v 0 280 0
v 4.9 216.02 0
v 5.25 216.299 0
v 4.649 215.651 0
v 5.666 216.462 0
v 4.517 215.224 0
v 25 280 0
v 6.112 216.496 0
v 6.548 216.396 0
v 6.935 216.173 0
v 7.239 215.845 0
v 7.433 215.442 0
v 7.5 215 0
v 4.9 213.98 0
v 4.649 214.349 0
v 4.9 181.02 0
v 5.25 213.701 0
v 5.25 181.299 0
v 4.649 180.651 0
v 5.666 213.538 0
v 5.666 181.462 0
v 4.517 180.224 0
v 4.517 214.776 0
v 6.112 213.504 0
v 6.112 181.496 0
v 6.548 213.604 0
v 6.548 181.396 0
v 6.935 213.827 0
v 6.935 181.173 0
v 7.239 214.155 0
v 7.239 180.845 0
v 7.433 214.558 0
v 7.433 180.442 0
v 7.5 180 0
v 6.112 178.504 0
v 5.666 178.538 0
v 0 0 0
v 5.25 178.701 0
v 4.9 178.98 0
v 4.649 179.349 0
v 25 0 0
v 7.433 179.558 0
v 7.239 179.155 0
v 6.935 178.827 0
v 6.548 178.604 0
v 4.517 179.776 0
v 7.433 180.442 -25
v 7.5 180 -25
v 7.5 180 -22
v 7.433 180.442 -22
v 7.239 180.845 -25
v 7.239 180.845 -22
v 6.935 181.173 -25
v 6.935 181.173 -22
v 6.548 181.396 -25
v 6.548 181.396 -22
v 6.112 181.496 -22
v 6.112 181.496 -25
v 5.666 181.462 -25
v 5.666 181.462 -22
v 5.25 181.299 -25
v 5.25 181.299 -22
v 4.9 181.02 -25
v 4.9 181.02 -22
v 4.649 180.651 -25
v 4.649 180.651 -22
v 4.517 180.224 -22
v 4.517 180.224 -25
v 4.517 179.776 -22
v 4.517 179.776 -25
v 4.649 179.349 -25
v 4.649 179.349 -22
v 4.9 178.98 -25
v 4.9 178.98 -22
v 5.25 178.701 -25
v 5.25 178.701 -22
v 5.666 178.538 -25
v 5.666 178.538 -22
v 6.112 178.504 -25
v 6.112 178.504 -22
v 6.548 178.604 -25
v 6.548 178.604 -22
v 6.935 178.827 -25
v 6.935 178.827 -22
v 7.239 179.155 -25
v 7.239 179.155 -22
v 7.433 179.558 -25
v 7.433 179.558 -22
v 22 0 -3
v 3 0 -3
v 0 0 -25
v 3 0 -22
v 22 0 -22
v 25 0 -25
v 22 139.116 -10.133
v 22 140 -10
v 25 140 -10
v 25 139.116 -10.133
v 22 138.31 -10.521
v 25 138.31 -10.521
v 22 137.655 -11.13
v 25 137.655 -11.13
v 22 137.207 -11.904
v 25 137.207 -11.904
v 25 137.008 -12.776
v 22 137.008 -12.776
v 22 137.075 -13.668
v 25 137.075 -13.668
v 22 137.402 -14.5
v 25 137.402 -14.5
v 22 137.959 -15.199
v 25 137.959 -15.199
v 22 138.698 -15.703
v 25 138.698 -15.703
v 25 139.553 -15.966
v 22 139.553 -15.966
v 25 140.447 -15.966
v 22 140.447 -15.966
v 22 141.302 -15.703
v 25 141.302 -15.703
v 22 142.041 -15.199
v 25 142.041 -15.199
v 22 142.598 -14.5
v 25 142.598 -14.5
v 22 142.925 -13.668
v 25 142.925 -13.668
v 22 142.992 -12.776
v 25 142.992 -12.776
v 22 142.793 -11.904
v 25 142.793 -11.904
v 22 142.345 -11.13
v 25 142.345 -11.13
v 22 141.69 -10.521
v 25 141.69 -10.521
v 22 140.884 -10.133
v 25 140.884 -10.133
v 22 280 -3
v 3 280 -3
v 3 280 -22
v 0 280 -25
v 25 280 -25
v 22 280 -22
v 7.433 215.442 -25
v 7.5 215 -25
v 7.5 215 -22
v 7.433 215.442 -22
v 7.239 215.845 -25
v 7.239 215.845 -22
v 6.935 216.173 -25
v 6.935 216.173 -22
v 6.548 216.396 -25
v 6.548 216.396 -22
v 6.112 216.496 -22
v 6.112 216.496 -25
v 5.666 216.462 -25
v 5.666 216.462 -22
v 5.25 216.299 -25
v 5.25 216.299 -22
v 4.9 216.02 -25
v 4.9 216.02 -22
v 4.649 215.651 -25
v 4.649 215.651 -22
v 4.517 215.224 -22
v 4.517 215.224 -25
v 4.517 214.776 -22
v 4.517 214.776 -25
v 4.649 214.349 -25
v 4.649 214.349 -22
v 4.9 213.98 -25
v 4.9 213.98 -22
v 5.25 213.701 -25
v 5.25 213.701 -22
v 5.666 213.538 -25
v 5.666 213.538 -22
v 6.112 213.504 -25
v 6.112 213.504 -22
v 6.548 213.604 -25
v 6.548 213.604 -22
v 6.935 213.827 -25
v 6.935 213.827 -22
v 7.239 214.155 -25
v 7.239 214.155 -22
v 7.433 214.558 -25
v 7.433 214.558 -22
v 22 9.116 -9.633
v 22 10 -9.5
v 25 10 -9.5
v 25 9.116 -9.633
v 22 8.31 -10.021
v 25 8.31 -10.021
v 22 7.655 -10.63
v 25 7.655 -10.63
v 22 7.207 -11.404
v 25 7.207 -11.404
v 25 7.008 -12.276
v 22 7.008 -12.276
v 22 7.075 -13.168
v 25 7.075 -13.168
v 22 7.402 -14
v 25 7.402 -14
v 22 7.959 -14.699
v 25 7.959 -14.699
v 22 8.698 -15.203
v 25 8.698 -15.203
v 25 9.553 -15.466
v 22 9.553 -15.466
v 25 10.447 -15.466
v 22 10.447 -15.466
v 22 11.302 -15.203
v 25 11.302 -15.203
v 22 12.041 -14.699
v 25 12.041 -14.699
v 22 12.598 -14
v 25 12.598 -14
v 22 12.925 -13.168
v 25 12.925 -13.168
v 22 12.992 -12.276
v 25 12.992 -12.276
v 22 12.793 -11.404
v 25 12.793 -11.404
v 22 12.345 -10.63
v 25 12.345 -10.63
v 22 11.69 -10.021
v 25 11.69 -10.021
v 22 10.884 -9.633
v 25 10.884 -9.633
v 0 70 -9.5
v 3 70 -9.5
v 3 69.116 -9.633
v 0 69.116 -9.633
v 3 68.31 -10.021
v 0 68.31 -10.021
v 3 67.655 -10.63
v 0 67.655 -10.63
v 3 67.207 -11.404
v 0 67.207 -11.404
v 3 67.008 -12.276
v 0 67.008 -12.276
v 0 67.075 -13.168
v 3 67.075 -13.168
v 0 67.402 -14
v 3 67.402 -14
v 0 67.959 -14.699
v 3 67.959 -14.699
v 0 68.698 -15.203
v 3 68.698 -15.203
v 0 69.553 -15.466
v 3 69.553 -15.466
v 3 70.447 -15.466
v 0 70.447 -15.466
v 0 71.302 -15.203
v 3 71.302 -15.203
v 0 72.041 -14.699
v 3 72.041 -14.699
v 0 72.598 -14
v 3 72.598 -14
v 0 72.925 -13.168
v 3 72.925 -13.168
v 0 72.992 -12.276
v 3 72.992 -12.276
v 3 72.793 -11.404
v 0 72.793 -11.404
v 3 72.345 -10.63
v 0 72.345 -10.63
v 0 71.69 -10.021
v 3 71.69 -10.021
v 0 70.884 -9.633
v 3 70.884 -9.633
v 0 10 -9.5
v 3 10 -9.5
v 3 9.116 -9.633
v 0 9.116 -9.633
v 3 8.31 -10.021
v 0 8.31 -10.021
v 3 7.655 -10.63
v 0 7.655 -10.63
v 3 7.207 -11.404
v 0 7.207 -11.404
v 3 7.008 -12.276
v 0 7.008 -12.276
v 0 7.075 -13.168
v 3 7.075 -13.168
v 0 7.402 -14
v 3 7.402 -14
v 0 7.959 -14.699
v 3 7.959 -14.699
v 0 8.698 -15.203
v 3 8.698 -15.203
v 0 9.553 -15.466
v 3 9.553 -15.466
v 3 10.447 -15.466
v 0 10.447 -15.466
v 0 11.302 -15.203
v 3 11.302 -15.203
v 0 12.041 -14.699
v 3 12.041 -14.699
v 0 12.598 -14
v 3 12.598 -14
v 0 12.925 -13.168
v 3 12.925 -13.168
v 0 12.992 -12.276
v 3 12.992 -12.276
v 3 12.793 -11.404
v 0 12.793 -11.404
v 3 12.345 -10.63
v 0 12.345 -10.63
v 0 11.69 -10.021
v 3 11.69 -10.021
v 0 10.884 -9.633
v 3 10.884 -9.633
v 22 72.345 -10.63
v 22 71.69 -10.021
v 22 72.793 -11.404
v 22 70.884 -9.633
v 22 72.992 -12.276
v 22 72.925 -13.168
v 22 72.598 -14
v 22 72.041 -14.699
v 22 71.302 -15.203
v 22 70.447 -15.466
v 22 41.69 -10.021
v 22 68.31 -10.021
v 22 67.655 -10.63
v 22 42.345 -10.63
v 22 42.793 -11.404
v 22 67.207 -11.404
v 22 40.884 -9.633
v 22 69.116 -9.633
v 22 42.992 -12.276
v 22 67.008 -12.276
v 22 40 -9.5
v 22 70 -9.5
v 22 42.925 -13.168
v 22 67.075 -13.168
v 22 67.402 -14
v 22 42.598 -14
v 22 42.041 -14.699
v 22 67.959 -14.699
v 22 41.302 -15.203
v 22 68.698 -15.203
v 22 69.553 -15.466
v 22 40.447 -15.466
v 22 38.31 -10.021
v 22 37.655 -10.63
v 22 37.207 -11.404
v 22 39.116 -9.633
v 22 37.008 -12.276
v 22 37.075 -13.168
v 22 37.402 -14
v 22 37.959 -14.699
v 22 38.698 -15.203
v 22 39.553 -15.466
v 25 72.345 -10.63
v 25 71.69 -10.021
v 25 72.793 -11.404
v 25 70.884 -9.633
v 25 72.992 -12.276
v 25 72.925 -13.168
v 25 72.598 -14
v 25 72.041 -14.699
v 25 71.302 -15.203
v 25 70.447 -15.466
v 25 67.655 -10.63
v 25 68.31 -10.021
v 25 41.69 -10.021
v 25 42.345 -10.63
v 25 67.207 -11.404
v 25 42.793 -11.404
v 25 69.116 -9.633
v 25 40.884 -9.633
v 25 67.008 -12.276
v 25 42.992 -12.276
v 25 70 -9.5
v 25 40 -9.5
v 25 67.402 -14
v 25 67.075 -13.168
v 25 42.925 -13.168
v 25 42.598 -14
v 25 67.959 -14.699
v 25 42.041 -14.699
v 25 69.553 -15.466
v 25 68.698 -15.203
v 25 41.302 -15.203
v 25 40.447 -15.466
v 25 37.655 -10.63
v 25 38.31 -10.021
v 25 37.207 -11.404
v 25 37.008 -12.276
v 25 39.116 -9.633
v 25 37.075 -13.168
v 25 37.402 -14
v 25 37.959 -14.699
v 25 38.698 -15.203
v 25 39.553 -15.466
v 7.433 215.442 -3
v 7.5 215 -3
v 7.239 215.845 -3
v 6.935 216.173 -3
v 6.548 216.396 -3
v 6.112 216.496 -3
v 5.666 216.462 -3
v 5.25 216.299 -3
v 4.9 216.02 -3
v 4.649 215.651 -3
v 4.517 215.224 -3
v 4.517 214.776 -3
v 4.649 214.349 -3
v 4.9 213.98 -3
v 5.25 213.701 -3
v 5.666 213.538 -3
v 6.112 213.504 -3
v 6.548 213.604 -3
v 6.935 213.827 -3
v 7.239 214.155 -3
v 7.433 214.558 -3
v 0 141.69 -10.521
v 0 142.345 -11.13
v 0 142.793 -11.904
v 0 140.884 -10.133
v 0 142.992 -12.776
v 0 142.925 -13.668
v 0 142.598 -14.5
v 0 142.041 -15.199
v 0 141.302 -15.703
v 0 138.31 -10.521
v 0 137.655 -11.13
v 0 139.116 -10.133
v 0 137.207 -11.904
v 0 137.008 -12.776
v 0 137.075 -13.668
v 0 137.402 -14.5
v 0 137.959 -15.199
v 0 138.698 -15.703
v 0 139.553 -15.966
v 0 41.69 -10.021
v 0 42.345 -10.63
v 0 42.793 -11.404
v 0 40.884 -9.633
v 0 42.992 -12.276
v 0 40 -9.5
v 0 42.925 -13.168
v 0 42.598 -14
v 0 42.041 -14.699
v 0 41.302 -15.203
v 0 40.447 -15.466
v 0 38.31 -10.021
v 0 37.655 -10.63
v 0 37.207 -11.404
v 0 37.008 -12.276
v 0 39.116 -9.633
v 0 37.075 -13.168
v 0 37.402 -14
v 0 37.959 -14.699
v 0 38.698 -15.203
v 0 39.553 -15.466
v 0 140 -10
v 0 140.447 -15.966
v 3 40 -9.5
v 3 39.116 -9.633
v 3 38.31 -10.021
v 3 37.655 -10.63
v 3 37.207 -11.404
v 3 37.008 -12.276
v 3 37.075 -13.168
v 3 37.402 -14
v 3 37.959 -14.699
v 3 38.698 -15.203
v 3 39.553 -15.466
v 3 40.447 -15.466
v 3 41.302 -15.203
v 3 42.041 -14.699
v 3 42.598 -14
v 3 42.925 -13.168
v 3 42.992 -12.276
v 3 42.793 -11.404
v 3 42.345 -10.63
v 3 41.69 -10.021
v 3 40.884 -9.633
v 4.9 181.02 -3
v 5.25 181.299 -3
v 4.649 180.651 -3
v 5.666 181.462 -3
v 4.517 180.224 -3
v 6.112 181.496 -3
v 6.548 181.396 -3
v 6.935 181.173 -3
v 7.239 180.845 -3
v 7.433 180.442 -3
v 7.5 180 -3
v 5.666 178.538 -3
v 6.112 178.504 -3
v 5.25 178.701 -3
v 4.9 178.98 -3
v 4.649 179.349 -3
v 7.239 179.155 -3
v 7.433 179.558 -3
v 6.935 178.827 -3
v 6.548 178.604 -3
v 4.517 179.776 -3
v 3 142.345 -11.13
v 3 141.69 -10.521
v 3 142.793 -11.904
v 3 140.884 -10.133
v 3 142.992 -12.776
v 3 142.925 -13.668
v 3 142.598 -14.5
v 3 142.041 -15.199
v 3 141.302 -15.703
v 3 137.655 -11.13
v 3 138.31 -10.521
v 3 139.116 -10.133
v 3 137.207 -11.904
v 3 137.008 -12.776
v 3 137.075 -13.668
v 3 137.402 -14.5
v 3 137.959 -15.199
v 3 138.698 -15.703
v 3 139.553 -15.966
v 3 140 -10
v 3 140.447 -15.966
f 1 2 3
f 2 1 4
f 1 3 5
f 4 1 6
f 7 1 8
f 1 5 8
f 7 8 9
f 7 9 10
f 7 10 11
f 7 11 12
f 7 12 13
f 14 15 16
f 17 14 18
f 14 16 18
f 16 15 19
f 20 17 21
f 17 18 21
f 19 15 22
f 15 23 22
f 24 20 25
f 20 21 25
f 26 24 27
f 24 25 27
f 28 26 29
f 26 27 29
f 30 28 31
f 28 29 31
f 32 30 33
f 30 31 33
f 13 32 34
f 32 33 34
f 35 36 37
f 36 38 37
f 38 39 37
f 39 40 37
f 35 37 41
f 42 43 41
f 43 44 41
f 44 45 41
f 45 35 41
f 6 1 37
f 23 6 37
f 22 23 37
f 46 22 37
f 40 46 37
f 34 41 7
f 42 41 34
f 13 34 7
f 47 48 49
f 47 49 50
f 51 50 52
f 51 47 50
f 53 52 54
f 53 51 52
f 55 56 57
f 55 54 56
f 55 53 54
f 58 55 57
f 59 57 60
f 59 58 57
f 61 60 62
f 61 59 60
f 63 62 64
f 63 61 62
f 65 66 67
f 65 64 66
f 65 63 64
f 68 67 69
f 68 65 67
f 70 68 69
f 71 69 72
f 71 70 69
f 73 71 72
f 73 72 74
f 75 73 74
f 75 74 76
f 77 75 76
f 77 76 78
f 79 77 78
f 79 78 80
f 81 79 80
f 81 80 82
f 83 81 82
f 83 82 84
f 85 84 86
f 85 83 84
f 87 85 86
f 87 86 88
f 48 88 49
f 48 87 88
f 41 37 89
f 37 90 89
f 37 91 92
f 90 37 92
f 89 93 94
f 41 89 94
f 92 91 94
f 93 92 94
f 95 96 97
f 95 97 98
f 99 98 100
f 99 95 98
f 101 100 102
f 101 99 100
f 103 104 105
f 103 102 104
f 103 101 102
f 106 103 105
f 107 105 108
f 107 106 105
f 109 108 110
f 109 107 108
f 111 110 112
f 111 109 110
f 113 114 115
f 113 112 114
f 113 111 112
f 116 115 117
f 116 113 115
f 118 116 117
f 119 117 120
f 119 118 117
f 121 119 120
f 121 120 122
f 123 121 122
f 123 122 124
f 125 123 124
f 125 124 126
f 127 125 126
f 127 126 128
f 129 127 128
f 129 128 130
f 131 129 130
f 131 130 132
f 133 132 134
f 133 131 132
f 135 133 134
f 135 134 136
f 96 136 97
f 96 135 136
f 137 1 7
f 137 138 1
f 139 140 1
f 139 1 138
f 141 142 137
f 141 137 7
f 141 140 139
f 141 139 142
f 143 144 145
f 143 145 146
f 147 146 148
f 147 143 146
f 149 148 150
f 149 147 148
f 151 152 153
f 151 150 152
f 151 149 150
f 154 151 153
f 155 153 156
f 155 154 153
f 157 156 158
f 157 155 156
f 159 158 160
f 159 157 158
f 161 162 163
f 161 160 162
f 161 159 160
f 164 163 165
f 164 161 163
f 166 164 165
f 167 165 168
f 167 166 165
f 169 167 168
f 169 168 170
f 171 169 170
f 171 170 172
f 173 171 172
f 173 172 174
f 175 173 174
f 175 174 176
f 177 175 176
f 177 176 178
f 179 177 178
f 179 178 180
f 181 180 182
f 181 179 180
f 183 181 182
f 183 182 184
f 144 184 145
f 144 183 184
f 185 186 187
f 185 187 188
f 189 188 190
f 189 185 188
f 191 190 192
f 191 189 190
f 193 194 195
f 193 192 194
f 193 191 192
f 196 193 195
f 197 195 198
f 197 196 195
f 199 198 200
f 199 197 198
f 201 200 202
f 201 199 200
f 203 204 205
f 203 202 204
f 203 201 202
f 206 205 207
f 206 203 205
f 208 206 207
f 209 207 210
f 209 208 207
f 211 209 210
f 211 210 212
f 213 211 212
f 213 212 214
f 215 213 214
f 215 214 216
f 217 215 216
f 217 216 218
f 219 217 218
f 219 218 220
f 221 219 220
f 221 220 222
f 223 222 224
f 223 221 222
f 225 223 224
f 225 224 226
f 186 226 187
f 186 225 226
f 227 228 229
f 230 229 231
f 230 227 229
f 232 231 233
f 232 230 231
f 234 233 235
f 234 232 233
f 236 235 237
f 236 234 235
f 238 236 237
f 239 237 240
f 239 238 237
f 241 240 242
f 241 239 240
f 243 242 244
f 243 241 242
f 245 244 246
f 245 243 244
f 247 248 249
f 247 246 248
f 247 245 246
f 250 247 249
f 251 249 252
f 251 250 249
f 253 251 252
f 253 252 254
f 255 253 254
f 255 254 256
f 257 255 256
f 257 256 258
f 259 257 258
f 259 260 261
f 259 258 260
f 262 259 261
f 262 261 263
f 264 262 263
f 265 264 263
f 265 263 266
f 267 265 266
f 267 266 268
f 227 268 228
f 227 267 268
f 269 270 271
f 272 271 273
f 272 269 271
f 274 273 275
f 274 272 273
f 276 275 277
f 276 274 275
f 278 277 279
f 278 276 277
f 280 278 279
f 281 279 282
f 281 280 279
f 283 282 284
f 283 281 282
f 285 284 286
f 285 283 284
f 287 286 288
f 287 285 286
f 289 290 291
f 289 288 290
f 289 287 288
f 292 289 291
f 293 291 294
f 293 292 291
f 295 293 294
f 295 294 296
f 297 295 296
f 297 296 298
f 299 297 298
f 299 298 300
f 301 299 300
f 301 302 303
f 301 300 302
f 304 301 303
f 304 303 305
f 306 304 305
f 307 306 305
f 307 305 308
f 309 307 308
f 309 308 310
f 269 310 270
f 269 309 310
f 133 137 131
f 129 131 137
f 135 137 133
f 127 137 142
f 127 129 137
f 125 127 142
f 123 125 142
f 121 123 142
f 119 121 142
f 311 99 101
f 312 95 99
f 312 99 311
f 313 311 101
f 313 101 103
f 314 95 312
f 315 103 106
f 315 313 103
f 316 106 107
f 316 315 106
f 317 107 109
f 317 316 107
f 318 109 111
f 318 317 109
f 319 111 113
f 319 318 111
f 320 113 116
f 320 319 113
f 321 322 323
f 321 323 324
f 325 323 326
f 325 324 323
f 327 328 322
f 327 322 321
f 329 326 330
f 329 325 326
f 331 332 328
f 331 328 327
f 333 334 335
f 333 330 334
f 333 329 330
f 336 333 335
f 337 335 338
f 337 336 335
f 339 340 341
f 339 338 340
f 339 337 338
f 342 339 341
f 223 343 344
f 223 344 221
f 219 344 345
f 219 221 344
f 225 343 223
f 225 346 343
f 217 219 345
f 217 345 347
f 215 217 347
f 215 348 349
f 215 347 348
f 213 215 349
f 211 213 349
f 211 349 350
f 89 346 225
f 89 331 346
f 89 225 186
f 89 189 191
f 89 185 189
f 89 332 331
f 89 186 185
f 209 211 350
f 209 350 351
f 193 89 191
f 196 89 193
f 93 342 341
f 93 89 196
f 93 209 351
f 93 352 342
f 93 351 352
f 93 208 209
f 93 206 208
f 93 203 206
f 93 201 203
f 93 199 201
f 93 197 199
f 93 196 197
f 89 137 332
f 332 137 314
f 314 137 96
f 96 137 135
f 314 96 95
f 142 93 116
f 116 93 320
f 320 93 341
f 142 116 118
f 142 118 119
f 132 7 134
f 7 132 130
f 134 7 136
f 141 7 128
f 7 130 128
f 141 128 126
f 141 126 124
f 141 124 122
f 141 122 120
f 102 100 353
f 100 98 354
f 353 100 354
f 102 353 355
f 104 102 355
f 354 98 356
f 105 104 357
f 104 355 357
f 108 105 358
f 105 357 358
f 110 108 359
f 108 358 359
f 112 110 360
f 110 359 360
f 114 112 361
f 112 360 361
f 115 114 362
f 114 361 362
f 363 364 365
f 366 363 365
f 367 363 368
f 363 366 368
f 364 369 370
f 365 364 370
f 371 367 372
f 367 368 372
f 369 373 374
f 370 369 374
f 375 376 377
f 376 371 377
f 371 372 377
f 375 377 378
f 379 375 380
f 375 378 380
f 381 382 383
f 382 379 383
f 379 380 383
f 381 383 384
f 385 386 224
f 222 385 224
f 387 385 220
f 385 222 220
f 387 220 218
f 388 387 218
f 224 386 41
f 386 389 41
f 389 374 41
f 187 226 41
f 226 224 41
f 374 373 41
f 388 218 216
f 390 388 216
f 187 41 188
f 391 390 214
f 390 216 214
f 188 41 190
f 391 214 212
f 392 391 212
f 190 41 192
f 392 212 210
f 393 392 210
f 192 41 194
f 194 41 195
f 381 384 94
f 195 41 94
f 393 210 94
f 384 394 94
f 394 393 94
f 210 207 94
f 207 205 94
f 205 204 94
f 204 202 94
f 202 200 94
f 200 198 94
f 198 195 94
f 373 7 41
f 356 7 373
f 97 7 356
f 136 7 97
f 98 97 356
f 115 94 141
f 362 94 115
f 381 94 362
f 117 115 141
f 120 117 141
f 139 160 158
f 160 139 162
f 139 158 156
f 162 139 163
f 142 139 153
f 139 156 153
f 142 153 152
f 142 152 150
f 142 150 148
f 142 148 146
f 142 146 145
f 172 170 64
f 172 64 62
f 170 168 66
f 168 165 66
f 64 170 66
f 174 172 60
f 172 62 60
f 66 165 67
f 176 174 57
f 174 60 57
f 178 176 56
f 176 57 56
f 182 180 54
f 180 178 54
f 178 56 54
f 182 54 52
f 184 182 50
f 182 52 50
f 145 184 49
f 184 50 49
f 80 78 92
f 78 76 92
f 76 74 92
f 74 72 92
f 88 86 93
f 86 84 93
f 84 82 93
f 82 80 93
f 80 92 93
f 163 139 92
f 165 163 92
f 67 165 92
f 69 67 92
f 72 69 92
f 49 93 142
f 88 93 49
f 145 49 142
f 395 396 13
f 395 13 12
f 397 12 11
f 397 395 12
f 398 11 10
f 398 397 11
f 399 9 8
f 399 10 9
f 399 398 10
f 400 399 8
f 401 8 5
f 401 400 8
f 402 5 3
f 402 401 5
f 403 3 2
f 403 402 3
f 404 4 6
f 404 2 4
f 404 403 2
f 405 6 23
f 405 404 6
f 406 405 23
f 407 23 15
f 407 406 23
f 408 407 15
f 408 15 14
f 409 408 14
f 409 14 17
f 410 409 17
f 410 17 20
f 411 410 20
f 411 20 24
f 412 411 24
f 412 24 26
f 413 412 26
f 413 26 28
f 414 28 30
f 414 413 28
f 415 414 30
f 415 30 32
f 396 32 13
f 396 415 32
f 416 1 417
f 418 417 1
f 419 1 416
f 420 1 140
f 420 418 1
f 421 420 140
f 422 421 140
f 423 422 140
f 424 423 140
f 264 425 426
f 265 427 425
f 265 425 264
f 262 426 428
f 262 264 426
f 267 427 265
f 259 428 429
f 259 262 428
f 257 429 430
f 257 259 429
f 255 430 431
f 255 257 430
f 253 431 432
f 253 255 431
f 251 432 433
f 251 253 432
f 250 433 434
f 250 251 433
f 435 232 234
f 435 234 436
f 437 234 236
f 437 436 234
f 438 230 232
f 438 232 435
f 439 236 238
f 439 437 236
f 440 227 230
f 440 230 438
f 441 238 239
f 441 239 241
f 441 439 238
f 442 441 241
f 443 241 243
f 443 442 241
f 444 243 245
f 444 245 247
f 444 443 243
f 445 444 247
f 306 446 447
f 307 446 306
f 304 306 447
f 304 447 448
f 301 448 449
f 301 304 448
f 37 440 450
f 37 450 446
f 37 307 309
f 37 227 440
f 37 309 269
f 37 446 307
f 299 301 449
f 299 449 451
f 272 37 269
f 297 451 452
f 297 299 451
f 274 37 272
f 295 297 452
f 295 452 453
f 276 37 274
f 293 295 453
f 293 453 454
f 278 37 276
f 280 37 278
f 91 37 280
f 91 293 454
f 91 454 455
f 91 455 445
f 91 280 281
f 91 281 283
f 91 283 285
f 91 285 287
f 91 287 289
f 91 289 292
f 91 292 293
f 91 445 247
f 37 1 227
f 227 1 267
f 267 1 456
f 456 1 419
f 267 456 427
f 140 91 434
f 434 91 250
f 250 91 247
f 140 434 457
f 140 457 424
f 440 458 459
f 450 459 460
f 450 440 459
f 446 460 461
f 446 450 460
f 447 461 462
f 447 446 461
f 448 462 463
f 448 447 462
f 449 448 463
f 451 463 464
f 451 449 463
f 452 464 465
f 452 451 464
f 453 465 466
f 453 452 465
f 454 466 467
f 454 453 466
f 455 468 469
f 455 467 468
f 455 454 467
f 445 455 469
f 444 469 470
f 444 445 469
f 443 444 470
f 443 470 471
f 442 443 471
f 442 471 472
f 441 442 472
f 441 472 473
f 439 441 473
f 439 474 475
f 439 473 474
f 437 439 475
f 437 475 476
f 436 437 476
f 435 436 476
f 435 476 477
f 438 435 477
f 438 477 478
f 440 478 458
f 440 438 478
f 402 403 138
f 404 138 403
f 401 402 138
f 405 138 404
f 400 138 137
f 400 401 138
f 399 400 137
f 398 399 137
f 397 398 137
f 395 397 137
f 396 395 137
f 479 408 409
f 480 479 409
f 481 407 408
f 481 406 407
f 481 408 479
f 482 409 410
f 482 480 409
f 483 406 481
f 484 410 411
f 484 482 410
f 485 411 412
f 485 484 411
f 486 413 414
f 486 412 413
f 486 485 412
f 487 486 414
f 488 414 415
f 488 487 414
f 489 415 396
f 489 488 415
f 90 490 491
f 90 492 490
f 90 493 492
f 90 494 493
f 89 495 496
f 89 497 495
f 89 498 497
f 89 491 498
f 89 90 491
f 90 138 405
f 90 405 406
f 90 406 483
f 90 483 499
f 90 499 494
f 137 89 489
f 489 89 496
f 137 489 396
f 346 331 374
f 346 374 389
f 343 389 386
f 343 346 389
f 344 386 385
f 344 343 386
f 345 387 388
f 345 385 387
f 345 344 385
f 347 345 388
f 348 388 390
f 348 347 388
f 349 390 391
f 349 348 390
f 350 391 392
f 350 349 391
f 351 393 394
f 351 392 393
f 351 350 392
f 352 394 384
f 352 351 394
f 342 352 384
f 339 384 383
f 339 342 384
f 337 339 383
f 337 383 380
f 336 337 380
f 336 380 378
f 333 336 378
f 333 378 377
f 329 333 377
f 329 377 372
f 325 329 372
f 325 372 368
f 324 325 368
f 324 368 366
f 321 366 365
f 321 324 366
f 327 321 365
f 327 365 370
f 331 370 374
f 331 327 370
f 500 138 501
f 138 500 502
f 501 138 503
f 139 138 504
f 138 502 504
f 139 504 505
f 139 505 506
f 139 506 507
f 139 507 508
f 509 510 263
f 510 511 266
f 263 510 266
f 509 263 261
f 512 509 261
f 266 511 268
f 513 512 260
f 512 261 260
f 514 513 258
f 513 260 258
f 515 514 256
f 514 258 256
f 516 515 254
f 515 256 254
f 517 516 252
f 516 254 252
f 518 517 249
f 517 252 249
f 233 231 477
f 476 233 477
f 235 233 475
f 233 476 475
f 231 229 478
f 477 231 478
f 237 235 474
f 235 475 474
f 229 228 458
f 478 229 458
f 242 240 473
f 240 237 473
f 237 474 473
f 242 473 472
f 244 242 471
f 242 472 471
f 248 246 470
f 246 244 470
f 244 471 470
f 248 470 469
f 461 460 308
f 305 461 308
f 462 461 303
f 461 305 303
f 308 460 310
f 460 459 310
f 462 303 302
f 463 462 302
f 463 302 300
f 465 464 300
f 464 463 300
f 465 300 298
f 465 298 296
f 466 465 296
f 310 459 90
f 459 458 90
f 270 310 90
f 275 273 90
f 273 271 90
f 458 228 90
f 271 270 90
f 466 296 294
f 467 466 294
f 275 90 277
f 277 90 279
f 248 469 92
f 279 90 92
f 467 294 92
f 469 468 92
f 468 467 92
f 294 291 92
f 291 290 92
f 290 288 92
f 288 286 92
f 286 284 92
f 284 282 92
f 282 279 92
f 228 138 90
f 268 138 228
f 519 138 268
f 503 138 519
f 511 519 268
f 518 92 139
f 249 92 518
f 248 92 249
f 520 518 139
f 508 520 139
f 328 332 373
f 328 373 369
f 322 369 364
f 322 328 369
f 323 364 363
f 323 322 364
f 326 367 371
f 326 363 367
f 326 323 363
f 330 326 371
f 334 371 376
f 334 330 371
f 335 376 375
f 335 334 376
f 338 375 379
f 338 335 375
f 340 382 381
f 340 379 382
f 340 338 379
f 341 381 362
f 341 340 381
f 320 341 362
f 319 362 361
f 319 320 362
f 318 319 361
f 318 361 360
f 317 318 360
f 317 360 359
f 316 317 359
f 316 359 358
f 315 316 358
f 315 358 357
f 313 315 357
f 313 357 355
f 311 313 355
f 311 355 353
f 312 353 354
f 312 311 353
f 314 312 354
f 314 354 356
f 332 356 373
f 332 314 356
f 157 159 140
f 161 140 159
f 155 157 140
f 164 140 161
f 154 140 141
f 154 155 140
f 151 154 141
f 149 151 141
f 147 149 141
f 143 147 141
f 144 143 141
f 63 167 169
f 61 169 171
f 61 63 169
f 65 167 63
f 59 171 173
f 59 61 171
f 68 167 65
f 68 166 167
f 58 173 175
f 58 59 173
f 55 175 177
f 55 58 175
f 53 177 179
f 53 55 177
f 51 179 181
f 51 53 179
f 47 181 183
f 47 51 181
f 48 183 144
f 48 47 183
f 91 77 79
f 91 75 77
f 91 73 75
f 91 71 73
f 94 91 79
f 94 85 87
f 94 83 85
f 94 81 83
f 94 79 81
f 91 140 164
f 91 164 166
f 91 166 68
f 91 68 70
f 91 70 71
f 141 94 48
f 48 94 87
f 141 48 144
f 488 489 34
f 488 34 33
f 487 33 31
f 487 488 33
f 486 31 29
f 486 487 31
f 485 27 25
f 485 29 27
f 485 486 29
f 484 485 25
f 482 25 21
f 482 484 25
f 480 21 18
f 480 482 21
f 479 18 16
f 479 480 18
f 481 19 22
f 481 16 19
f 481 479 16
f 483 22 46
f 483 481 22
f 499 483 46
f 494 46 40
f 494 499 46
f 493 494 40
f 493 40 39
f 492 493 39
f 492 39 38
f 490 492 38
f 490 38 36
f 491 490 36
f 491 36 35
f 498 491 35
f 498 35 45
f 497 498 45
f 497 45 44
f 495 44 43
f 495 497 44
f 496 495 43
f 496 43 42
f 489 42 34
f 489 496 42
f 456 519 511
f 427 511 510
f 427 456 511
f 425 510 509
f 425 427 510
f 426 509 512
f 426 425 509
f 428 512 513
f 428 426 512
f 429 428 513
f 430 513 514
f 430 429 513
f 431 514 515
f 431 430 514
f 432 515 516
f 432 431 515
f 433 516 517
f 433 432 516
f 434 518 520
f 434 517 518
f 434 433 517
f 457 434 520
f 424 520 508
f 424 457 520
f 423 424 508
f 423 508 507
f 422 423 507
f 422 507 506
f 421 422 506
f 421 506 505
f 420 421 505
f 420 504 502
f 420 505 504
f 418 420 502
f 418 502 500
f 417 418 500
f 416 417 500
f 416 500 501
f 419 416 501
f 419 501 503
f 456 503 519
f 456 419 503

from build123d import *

# Parameters (mm, degrees)
SKETCH_1_W               = 25
SKETCH_1_H               = 25
SKETCH_1_W_2             = 19
SKETCH_1_H_2             = 19
EXTRUDE_1_DEPTH          = 280
SKETCH_2_R               = 3
CUT_EXTRUDE_1_DEPTH      = 283.223315833
CUT_EXTRUDE_2_DEPTH      = 283.223315833
CUT_EXTRUDE_2_DEPTH_BACK = 283.223315833
SKETCH_3_R               = 1.5


with BuildPart() as part:
    # 草图1 → 凸台-拉伸1 (new body)
    with BuildSketch(Plane(origin=(0, 0, 0), x_dir=(1, 0, 0), z_dir=(0, 1, 0))):
        with Locations((12.5, 12.5)):
            Rectangle(SKETCH_1_W, SKETCH_1_H)
        with Locations((12.5, 12.5)):
            Rectangle(SKETCH_1_W_2, SKETCH_1_H_2, mode=Mode.SUBTRACT)
    extrude(amount=EXTRUDE_1_DEPTH)

    # 草图2 → 切除-拉伸1 (cut, through all)
    with BuildSketch(Plane(origin=(0, 0, 0), x_dir=(0, 0, -1), z_dir=(1, 0, 0))):
        with Locations(Location((12.5, 10, 0), (0, 0, 180))):
            Circle(SKETCH_2_R)
        with Locations(Location((12.5, 40, 0), (0, 0, 180))):
            Circle(SKETCH_2_R)
        with Locations(Location((12.5, 70, 0), (0, 0, 180))):
            Circle(SKETCH_2_R)
        with Locations(Location((13, 140, 0), (0, 0, 180))):
            Circle(SKETCH_2_R)
    extrude(amount=CUT_EXTRUDE_1_DEPTH, mode=Mode.SUBTRACT)

    # 草图3 → 切除-拉伸2 (cut, two sides: drawn at the far end of the back side and taken through both)
    with BuildSketch(Plane.XY.offset(-CUT_EXTRUDE_2_DEPTH_BACK)):
        with Locations((6, 180)):
            Circle(SKETCH_3_R)
        with Locations((6, 215)):
            Circle(SKETCH_3_R)
    extrude(amount=CUT_EXTRUDE_2_DEPTH + CUT_EXTRUDE_2_DEPTH_BACK, mode=Mode.SUBTRACT)


solid = part.part
